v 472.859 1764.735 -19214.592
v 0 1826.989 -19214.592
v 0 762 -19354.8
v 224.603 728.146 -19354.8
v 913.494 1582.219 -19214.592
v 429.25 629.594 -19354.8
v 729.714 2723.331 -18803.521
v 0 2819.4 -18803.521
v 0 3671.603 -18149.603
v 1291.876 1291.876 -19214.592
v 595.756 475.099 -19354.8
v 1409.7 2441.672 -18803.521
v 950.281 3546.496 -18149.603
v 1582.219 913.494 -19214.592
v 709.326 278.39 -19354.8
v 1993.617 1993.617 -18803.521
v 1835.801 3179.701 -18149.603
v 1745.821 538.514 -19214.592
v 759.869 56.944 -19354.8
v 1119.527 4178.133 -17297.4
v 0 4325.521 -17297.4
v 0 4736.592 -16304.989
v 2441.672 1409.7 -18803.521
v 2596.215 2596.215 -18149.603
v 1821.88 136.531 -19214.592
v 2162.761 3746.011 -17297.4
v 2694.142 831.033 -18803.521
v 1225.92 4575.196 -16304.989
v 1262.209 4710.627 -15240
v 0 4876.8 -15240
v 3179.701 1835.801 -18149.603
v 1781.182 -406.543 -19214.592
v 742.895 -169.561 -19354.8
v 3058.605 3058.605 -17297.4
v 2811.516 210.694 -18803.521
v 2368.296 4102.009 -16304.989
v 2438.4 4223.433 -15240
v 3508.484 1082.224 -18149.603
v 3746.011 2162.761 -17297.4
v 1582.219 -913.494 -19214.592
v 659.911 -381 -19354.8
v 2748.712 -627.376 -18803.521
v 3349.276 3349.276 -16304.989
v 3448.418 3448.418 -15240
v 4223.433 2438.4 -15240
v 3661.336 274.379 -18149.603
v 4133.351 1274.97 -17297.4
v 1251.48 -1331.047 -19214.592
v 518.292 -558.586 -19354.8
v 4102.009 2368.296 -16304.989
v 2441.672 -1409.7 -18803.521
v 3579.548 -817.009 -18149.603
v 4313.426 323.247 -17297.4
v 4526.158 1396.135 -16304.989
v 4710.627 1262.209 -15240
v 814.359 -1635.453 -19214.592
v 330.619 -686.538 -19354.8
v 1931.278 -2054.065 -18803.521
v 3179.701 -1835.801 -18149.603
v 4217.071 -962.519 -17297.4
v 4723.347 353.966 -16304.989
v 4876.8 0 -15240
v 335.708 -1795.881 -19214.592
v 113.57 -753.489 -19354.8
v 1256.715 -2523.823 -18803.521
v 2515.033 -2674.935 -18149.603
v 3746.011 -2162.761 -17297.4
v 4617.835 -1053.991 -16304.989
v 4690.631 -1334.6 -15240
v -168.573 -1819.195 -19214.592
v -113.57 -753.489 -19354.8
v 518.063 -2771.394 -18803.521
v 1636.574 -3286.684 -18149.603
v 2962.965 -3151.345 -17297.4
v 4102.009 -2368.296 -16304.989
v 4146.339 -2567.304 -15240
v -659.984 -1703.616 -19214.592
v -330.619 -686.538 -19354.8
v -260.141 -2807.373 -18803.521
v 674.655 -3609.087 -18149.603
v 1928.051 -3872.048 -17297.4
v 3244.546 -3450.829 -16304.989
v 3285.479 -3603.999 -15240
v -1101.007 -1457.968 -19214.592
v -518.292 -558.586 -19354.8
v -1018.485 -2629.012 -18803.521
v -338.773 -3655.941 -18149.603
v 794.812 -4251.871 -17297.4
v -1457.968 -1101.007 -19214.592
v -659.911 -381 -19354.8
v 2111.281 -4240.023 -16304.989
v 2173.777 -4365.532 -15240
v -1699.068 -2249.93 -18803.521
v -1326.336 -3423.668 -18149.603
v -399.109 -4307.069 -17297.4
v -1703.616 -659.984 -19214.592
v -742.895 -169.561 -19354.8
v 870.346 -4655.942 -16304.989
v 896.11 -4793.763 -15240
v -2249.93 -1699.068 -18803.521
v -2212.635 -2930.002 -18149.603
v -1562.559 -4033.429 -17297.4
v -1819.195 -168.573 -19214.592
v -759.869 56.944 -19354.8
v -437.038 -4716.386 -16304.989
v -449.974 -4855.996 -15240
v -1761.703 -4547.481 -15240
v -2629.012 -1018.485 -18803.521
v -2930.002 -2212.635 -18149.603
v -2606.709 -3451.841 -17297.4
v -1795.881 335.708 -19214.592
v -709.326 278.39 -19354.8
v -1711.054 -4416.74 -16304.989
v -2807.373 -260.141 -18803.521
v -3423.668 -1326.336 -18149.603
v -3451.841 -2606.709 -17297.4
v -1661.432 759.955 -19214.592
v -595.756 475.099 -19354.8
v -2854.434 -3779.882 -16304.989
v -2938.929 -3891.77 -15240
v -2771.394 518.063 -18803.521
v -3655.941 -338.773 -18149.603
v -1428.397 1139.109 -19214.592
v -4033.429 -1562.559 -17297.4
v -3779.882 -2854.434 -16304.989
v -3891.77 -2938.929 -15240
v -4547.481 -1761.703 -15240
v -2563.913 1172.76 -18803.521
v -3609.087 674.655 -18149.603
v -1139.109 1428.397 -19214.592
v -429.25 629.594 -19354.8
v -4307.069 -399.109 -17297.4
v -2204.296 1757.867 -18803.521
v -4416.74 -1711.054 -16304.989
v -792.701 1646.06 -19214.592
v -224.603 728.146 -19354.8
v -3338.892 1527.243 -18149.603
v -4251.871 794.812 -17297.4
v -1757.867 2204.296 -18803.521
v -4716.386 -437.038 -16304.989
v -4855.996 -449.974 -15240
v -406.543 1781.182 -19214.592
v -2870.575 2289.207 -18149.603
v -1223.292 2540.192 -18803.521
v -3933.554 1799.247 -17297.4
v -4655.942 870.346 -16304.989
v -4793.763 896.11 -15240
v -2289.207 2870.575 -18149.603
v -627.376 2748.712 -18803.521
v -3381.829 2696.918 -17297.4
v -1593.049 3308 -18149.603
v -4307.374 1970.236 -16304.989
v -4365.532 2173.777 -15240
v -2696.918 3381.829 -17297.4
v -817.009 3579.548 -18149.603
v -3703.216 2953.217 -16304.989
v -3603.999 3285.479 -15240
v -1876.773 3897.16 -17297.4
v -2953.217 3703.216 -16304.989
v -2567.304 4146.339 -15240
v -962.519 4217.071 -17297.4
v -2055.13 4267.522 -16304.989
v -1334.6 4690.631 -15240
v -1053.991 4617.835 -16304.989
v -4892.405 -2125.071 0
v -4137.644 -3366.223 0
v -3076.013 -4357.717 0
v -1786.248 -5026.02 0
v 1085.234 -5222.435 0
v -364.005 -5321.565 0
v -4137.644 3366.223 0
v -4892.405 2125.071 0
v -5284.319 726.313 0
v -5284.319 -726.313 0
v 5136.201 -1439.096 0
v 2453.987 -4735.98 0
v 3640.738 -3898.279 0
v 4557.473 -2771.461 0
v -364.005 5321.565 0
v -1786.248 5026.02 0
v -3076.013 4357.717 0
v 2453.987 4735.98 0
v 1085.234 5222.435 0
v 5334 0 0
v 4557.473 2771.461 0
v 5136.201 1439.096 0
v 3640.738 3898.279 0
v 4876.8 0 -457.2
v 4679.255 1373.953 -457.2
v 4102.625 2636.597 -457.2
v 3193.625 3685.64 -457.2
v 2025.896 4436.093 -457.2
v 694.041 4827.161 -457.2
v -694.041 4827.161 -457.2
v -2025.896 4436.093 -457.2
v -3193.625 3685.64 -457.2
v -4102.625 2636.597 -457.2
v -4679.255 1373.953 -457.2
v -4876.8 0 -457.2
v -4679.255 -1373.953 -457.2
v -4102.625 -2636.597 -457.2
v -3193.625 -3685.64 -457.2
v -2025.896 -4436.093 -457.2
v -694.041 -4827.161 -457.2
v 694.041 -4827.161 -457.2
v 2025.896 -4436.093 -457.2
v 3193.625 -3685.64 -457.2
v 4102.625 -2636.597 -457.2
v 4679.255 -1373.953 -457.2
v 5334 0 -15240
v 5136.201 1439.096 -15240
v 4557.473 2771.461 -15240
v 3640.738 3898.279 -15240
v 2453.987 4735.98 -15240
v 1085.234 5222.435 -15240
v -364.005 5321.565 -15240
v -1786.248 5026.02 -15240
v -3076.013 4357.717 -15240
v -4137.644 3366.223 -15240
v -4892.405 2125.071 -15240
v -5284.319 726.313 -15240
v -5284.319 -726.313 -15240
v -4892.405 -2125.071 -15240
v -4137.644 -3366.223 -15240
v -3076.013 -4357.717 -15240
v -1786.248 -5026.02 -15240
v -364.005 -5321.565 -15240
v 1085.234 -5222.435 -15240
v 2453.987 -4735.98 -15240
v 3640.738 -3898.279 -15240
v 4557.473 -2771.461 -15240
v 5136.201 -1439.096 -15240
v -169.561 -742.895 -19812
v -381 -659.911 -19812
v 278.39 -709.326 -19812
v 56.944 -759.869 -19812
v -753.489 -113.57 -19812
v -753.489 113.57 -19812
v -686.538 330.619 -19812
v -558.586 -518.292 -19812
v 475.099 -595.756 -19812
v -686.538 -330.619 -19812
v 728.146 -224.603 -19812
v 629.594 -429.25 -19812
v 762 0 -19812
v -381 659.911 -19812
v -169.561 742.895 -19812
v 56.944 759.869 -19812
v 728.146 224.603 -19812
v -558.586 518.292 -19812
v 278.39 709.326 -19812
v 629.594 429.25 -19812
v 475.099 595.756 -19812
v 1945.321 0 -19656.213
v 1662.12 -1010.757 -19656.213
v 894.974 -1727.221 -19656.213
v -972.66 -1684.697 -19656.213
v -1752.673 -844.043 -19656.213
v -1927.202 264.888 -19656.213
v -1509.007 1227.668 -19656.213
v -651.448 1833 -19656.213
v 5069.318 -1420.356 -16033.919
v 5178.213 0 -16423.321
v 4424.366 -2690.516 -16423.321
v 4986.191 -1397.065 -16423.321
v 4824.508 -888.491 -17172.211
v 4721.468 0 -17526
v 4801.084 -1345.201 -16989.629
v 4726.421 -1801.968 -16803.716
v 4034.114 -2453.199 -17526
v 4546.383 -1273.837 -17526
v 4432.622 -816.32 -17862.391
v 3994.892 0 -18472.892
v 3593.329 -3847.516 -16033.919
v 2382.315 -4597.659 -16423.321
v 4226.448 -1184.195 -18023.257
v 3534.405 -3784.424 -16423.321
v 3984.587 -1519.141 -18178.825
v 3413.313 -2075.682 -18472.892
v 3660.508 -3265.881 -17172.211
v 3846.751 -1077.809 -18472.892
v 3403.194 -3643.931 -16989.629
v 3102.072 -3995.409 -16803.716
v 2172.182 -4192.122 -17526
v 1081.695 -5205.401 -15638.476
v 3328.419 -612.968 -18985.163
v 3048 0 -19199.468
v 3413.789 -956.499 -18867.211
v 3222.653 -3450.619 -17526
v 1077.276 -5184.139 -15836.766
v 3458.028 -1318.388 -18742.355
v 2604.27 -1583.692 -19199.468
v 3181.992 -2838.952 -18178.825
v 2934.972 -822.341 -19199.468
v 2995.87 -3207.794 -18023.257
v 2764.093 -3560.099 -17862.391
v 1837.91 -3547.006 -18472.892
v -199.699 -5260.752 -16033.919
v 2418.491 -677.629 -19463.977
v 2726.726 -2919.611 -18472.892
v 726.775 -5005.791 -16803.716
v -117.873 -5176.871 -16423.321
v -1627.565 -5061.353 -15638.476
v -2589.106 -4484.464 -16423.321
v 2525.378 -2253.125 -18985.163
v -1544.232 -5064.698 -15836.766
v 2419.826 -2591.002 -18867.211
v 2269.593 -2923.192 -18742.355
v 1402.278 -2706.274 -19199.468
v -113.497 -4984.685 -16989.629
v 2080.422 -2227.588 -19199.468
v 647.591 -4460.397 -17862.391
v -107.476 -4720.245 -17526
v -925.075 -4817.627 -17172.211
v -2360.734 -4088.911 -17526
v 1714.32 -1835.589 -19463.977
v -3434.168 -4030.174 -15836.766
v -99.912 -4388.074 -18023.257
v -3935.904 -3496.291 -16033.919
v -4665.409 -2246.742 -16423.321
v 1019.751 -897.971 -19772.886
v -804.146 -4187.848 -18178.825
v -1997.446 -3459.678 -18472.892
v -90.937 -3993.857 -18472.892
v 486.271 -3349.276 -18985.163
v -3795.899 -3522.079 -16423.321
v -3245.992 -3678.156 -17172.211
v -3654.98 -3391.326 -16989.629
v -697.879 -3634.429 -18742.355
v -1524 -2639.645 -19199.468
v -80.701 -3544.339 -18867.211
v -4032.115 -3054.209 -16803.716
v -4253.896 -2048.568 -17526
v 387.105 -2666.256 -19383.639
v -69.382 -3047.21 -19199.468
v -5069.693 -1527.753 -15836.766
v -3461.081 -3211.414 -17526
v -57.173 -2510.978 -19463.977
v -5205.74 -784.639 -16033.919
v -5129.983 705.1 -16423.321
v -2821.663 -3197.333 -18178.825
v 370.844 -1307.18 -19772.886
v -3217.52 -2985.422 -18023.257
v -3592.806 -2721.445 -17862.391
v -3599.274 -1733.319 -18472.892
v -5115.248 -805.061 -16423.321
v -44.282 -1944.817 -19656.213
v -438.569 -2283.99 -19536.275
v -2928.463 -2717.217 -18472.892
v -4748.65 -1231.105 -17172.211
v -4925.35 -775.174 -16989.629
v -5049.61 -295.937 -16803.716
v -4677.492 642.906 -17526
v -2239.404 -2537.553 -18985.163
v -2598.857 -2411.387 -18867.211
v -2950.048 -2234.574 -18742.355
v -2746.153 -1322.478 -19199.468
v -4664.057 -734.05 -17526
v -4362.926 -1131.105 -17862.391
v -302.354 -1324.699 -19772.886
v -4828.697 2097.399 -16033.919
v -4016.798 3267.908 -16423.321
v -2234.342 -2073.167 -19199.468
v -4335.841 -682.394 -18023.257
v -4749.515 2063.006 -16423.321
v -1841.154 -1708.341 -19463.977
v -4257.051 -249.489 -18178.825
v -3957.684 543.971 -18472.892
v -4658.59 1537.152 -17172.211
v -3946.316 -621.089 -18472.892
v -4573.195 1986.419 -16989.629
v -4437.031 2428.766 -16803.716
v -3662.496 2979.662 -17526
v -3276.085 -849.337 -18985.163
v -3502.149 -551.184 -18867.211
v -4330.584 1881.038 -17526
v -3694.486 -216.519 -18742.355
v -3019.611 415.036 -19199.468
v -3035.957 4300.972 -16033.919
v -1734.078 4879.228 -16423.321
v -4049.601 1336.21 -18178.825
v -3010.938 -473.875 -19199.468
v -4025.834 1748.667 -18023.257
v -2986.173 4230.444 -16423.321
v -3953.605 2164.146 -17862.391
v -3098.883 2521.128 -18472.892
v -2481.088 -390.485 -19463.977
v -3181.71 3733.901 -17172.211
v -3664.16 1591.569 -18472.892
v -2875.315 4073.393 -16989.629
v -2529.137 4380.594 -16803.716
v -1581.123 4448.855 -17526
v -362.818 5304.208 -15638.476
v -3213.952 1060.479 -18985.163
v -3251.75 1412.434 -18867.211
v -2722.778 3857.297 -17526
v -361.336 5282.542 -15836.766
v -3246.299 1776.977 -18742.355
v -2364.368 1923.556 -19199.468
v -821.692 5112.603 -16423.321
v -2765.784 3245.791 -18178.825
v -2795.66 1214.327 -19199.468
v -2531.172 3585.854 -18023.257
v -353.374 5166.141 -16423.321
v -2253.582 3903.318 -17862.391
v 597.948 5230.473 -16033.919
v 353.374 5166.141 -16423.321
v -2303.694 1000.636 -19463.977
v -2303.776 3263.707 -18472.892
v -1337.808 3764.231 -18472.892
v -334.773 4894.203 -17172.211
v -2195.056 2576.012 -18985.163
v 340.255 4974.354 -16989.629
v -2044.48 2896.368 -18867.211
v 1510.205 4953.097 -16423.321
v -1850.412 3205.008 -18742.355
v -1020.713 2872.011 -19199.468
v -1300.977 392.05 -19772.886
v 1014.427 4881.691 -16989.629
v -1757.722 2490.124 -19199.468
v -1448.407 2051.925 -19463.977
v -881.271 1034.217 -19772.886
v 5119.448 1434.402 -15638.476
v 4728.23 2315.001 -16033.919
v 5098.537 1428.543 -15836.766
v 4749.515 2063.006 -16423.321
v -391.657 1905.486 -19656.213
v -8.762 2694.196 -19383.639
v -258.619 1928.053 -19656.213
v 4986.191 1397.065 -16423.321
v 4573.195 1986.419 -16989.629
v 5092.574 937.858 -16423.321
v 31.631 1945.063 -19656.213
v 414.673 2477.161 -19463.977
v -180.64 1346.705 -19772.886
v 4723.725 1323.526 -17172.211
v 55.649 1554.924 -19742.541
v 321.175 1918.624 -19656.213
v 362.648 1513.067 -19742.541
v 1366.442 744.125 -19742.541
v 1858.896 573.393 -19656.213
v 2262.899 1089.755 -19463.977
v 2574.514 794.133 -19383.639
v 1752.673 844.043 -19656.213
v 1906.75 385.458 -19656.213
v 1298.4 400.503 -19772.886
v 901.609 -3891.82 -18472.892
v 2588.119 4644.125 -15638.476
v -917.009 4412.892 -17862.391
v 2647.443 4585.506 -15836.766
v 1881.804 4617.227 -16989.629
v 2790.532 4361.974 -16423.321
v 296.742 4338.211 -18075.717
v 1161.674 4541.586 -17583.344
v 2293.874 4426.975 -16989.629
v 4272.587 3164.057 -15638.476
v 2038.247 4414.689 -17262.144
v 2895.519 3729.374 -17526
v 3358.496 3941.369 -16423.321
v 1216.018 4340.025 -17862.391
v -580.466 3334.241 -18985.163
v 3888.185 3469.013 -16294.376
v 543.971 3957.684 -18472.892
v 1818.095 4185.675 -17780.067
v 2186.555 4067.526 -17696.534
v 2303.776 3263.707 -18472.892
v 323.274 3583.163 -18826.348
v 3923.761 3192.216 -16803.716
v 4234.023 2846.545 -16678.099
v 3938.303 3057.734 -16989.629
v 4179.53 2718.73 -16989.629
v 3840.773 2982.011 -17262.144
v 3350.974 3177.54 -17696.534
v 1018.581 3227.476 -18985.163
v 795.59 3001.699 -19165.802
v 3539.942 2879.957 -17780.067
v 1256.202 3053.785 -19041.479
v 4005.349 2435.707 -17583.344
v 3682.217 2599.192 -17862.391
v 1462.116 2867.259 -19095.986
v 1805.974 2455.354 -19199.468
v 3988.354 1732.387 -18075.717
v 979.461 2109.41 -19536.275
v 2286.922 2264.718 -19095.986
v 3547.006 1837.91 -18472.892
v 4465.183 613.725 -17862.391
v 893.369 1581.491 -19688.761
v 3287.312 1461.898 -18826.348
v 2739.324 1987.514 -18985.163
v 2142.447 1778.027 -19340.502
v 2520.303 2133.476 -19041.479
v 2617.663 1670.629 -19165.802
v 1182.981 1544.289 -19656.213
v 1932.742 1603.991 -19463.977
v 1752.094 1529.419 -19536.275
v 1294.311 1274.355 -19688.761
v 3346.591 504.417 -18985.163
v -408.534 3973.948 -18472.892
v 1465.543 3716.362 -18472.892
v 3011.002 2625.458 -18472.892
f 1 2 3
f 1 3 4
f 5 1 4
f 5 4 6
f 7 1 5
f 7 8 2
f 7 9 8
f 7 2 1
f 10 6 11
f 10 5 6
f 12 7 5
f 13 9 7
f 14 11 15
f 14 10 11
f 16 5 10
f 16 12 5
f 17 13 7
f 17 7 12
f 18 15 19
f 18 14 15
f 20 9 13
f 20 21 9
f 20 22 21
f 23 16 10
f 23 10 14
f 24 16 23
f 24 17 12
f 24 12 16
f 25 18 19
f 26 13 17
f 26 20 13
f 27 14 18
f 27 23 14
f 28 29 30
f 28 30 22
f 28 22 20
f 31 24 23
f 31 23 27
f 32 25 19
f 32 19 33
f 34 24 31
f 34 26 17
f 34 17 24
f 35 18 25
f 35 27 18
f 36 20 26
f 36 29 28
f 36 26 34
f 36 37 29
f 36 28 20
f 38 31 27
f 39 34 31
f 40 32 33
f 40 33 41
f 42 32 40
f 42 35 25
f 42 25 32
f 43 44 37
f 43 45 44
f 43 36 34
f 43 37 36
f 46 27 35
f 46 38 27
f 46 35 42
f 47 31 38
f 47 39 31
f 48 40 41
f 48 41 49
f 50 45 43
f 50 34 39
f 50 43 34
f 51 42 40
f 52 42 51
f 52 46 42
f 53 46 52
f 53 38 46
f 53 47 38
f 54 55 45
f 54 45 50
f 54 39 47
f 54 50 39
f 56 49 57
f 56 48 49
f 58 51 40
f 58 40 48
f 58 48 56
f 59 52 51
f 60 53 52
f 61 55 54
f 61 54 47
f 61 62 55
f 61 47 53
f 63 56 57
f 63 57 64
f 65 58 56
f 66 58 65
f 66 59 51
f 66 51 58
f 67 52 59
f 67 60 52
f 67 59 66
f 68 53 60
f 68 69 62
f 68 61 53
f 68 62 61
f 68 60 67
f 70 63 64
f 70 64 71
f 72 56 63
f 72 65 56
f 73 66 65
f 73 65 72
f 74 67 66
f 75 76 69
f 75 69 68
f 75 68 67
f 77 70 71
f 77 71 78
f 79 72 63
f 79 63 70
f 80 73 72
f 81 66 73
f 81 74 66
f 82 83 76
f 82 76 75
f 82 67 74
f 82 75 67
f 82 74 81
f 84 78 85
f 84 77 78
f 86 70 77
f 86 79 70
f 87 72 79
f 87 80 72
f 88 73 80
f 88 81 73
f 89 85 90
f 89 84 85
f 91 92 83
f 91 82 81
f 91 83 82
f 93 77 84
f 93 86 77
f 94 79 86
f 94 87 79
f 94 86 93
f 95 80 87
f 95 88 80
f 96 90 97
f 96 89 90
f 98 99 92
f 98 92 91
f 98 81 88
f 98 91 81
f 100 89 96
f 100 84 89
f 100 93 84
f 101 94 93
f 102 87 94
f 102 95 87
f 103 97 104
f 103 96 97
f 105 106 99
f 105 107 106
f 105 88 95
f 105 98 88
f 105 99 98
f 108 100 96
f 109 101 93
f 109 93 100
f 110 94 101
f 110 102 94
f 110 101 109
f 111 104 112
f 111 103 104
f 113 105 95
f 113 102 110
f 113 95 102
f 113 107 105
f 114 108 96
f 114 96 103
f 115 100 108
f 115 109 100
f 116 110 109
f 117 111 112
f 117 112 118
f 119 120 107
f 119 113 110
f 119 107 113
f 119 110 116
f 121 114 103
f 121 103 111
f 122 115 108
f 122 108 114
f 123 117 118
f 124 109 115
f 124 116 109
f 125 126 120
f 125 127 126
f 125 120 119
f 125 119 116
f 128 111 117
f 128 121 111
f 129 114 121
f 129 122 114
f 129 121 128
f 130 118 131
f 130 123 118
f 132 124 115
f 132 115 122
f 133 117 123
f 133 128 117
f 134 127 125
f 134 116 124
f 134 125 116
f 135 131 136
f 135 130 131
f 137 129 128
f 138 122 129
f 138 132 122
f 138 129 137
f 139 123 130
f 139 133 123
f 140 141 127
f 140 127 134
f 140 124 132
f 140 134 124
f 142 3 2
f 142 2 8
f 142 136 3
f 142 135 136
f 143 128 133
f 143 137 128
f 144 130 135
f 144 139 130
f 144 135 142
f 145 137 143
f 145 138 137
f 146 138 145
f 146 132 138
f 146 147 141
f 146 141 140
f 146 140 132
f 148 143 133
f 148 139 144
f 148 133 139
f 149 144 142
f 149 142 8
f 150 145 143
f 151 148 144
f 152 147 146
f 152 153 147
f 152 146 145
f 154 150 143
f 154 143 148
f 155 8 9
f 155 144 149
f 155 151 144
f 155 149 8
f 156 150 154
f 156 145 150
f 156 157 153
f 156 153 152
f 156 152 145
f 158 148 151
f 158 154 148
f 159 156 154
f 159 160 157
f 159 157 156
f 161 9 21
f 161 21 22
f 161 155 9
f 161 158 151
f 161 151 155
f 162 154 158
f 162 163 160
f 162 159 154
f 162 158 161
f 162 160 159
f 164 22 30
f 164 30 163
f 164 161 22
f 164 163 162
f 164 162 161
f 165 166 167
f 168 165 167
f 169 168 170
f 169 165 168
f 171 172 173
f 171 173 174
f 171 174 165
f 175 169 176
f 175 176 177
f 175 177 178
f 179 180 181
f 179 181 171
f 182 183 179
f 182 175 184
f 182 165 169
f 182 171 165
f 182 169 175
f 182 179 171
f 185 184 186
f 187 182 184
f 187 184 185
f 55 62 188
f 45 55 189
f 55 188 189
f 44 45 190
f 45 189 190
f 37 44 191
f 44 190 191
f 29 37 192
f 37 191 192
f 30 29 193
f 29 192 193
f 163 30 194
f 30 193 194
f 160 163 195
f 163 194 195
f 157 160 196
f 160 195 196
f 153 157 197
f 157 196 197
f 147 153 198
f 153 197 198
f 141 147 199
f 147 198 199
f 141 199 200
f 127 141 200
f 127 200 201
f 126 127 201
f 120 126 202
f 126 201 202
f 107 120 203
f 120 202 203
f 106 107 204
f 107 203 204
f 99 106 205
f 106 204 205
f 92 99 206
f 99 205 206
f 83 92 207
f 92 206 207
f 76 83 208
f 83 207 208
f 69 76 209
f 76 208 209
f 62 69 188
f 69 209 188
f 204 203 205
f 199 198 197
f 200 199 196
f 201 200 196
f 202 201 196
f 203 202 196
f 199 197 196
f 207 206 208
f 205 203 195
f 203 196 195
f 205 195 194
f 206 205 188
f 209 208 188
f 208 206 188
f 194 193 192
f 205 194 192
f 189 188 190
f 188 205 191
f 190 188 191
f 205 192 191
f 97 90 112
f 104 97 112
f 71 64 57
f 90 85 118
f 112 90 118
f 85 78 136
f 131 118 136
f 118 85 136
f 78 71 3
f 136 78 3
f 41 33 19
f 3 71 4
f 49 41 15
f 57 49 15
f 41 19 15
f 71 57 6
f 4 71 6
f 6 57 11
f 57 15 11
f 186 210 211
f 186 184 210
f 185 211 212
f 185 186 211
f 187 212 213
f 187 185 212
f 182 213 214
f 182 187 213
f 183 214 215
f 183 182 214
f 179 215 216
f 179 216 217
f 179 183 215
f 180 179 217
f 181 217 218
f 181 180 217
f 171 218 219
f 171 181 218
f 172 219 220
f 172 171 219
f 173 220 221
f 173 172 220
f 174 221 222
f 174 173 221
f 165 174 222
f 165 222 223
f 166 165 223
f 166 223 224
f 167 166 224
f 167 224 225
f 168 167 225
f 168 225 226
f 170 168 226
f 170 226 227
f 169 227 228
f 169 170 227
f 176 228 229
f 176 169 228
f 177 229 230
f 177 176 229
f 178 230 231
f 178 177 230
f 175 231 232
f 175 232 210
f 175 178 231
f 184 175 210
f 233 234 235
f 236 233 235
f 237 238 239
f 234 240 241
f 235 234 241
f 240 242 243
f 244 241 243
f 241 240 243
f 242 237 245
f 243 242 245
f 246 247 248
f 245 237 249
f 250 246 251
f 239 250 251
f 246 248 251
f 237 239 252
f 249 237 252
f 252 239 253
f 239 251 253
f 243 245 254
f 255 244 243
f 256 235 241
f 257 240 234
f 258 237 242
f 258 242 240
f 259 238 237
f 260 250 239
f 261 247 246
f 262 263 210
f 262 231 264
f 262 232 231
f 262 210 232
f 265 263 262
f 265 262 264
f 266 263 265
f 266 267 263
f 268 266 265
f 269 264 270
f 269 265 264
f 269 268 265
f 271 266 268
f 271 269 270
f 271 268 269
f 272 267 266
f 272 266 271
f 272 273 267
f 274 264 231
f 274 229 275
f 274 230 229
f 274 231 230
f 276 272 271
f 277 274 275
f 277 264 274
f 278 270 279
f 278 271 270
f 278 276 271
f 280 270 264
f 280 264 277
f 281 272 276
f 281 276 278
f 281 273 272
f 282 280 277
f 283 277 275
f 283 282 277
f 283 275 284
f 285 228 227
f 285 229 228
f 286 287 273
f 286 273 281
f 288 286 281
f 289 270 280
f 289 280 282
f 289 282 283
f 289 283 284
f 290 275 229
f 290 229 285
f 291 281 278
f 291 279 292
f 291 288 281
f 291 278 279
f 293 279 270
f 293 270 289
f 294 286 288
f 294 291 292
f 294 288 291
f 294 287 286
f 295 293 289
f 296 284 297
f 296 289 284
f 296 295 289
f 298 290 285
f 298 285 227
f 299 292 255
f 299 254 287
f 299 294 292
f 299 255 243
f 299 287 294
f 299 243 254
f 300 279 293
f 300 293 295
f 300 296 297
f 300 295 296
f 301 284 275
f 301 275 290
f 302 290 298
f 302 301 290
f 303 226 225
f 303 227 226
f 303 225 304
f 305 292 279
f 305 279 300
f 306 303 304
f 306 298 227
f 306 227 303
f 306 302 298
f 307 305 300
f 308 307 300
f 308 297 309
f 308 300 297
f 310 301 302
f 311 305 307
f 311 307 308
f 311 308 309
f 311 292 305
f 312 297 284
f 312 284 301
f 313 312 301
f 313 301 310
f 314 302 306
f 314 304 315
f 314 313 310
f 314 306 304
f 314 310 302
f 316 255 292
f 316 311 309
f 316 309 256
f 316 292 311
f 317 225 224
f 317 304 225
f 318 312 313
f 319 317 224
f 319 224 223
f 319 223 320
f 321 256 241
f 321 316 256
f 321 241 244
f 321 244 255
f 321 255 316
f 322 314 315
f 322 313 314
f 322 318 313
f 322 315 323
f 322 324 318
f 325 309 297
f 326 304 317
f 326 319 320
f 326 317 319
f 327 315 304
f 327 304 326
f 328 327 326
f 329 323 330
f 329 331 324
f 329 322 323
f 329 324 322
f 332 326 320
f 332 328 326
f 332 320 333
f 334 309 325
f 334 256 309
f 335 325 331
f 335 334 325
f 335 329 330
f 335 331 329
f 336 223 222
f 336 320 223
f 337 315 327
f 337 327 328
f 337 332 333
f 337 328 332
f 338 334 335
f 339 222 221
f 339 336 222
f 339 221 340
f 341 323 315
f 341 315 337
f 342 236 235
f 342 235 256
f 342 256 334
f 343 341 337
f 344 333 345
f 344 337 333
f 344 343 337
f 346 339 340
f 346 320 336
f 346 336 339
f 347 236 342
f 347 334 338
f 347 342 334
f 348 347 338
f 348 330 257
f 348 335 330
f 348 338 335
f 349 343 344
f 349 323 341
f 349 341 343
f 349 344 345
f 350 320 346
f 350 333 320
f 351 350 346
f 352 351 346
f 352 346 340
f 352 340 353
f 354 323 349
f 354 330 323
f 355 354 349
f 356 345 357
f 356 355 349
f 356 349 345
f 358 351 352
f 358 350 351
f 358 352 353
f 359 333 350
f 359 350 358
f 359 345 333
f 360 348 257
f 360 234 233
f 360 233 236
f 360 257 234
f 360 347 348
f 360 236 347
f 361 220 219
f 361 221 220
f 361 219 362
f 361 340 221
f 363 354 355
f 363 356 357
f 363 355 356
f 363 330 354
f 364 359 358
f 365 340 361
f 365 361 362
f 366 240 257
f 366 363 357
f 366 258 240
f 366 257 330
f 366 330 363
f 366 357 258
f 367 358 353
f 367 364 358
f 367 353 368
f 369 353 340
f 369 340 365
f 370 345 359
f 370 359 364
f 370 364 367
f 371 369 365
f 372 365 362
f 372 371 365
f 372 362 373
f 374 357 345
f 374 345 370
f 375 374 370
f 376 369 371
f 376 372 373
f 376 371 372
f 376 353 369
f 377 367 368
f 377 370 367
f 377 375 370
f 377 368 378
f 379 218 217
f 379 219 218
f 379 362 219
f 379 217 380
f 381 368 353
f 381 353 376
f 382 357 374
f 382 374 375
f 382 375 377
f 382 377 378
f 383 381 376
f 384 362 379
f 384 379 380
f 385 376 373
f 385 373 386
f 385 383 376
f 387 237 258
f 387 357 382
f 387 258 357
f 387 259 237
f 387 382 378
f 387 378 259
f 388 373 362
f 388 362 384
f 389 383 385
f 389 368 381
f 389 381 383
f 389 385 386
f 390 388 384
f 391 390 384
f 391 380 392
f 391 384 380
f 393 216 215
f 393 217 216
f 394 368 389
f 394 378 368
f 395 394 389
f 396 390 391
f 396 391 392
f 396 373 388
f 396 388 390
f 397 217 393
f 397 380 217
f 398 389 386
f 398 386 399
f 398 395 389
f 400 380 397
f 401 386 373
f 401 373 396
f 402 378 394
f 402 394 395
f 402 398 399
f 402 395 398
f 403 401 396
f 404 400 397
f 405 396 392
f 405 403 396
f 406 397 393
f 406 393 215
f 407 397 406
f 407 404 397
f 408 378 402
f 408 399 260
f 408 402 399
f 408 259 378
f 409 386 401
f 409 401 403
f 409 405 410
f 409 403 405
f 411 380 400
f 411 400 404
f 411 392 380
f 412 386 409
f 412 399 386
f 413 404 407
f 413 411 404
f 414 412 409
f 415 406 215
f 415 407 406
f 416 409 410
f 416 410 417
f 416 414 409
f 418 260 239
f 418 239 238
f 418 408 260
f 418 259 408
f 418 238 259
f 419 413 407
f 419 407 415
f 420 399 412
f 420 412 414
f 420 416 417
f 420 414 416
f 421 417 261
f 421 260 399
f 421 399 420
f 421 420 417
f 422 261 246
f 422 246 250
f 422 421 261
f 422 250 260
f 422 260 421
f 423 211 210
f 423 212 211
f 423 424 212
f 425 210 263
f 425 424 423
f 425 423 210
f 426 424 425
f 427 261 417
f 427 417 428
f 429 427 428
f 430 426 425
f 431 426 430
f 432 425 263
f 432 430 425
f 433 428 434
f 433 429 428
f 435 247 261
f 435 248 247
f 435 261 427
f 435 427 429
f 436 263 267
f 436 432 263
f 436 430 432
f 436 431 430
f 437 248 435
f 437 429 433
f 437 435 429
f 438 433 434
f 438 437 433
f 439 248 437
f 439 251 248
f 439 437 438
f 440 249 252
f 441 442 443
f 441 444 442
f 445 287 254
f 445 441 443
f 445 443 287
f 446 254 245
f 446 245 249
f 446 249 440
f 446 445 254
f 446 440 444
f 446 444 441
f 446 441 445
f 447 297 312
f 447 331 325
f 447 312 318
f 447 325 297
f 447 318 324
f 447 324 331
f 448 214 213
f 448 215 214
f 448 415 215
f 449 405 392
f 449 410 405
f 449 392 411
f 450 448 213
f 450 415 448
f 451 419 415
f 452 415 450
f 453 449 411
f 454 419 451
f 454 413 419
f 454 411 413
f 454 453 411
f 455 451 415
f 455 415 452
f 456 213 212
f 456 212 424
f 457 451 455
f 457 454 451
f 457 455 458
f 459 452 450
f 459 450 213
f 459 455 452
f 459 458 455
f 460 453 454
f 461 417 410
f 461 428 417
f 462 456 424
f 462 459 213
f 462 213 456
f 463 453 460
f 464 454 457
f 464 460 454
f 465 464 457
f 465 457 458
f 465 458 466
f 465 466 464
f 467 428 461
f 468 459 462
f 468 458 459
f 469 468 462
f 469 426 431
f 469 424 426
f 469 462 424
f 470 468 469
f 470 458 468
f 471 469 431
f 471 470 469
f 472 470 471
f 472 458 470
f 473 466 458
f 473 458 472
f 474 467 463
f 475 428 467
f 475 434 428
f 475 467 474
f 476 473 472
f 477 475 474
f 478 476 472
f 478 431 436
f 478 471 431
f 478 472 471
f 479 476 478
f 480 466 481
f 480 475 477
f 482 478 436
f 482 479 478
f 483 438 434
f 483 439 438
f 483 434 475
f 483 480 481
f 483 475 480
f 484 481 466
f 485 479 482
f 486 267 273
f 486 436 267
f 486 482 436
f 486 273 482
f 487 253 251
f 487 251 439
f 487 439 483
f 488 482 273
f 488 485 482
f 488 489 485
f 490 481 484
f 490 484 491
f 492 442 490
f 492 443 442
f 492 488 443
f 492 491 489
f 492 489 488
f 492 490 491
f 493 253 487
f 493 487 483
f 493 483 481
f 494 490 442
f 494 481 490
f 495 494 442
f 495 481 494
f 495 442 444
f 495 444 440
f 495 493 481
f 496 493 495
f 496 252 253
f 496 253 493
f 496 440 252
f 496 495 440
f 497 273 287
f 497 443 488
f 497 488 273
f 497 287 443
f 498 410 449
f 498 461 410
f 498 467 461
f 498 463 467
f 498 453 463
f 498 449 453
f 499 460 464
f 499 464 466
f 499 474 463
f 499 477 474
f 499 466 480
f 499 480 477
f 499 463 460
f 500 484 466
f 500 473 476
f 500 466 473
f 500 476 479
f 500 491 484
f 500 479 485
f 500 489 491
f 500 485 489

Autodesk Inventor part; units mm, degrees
ref_plane "YZ Plane" through (0, 0, 0) normal (1, 0, 0) x (0, 1, 0)
ref_plane "XZ Plane" through (0, 0, 0) normal (0, 1, 0) x (-1, 0, 0)
ref_plane "XY Plane" through (0, 0, 0) normal (0, 0, 1) x (1, 0, 0)
sketch "Sketch1" plane through (0, 0, 0) normal (0, 0, 1) x (1, 0, 0)
  circle A0 centre (0, 0) radius 5334
  dimension "d0" = 10668
extrude "Extrusion1" add sketch "Sketch1" against normal blind 19812
sketch "Sketch2" plane through (0, 0, 0) normal (0, 0, 1) x (1, 0, 0)
  circle A0 centre (0, 0) radius 4876.8
fillet "Fillet1" radius 4572 1 edges at (-5334, 0, -19812)
sketch "Sketch3" plane through (0, 0, 0) normal (1, 0, 0) x (0, 1, 0)
  line L0 (0, -15240) -> (0, -19354.8)
  line L1 (0, -15240) -> (4876.8, -15240)
  arc A0 (762, -19354.8) -> (4876.8, -15240) centre (762, -15240) ccw
  line L2 (762, -19354.8) -> (0, -19354.8)
  point P0 (0, 0)
revolve "Revolution1" cut sketch "Sketch3" angle 360 about axis through (0, 0, -15240) along (0, 0, -1)
extrude "Extrusion2" cut sketch "Sketch2" against normal blind 15240
sketch "Sketch4" plane through (0, 0, 0) normal (0, 0, 1) x (1, 0, 0)
  circle A0 centre (0, 0) radius 5334
extrude "Extrusion3" add sketch "Sketch4" against normal blind 457.2
properties part number "ex_tank_H"
